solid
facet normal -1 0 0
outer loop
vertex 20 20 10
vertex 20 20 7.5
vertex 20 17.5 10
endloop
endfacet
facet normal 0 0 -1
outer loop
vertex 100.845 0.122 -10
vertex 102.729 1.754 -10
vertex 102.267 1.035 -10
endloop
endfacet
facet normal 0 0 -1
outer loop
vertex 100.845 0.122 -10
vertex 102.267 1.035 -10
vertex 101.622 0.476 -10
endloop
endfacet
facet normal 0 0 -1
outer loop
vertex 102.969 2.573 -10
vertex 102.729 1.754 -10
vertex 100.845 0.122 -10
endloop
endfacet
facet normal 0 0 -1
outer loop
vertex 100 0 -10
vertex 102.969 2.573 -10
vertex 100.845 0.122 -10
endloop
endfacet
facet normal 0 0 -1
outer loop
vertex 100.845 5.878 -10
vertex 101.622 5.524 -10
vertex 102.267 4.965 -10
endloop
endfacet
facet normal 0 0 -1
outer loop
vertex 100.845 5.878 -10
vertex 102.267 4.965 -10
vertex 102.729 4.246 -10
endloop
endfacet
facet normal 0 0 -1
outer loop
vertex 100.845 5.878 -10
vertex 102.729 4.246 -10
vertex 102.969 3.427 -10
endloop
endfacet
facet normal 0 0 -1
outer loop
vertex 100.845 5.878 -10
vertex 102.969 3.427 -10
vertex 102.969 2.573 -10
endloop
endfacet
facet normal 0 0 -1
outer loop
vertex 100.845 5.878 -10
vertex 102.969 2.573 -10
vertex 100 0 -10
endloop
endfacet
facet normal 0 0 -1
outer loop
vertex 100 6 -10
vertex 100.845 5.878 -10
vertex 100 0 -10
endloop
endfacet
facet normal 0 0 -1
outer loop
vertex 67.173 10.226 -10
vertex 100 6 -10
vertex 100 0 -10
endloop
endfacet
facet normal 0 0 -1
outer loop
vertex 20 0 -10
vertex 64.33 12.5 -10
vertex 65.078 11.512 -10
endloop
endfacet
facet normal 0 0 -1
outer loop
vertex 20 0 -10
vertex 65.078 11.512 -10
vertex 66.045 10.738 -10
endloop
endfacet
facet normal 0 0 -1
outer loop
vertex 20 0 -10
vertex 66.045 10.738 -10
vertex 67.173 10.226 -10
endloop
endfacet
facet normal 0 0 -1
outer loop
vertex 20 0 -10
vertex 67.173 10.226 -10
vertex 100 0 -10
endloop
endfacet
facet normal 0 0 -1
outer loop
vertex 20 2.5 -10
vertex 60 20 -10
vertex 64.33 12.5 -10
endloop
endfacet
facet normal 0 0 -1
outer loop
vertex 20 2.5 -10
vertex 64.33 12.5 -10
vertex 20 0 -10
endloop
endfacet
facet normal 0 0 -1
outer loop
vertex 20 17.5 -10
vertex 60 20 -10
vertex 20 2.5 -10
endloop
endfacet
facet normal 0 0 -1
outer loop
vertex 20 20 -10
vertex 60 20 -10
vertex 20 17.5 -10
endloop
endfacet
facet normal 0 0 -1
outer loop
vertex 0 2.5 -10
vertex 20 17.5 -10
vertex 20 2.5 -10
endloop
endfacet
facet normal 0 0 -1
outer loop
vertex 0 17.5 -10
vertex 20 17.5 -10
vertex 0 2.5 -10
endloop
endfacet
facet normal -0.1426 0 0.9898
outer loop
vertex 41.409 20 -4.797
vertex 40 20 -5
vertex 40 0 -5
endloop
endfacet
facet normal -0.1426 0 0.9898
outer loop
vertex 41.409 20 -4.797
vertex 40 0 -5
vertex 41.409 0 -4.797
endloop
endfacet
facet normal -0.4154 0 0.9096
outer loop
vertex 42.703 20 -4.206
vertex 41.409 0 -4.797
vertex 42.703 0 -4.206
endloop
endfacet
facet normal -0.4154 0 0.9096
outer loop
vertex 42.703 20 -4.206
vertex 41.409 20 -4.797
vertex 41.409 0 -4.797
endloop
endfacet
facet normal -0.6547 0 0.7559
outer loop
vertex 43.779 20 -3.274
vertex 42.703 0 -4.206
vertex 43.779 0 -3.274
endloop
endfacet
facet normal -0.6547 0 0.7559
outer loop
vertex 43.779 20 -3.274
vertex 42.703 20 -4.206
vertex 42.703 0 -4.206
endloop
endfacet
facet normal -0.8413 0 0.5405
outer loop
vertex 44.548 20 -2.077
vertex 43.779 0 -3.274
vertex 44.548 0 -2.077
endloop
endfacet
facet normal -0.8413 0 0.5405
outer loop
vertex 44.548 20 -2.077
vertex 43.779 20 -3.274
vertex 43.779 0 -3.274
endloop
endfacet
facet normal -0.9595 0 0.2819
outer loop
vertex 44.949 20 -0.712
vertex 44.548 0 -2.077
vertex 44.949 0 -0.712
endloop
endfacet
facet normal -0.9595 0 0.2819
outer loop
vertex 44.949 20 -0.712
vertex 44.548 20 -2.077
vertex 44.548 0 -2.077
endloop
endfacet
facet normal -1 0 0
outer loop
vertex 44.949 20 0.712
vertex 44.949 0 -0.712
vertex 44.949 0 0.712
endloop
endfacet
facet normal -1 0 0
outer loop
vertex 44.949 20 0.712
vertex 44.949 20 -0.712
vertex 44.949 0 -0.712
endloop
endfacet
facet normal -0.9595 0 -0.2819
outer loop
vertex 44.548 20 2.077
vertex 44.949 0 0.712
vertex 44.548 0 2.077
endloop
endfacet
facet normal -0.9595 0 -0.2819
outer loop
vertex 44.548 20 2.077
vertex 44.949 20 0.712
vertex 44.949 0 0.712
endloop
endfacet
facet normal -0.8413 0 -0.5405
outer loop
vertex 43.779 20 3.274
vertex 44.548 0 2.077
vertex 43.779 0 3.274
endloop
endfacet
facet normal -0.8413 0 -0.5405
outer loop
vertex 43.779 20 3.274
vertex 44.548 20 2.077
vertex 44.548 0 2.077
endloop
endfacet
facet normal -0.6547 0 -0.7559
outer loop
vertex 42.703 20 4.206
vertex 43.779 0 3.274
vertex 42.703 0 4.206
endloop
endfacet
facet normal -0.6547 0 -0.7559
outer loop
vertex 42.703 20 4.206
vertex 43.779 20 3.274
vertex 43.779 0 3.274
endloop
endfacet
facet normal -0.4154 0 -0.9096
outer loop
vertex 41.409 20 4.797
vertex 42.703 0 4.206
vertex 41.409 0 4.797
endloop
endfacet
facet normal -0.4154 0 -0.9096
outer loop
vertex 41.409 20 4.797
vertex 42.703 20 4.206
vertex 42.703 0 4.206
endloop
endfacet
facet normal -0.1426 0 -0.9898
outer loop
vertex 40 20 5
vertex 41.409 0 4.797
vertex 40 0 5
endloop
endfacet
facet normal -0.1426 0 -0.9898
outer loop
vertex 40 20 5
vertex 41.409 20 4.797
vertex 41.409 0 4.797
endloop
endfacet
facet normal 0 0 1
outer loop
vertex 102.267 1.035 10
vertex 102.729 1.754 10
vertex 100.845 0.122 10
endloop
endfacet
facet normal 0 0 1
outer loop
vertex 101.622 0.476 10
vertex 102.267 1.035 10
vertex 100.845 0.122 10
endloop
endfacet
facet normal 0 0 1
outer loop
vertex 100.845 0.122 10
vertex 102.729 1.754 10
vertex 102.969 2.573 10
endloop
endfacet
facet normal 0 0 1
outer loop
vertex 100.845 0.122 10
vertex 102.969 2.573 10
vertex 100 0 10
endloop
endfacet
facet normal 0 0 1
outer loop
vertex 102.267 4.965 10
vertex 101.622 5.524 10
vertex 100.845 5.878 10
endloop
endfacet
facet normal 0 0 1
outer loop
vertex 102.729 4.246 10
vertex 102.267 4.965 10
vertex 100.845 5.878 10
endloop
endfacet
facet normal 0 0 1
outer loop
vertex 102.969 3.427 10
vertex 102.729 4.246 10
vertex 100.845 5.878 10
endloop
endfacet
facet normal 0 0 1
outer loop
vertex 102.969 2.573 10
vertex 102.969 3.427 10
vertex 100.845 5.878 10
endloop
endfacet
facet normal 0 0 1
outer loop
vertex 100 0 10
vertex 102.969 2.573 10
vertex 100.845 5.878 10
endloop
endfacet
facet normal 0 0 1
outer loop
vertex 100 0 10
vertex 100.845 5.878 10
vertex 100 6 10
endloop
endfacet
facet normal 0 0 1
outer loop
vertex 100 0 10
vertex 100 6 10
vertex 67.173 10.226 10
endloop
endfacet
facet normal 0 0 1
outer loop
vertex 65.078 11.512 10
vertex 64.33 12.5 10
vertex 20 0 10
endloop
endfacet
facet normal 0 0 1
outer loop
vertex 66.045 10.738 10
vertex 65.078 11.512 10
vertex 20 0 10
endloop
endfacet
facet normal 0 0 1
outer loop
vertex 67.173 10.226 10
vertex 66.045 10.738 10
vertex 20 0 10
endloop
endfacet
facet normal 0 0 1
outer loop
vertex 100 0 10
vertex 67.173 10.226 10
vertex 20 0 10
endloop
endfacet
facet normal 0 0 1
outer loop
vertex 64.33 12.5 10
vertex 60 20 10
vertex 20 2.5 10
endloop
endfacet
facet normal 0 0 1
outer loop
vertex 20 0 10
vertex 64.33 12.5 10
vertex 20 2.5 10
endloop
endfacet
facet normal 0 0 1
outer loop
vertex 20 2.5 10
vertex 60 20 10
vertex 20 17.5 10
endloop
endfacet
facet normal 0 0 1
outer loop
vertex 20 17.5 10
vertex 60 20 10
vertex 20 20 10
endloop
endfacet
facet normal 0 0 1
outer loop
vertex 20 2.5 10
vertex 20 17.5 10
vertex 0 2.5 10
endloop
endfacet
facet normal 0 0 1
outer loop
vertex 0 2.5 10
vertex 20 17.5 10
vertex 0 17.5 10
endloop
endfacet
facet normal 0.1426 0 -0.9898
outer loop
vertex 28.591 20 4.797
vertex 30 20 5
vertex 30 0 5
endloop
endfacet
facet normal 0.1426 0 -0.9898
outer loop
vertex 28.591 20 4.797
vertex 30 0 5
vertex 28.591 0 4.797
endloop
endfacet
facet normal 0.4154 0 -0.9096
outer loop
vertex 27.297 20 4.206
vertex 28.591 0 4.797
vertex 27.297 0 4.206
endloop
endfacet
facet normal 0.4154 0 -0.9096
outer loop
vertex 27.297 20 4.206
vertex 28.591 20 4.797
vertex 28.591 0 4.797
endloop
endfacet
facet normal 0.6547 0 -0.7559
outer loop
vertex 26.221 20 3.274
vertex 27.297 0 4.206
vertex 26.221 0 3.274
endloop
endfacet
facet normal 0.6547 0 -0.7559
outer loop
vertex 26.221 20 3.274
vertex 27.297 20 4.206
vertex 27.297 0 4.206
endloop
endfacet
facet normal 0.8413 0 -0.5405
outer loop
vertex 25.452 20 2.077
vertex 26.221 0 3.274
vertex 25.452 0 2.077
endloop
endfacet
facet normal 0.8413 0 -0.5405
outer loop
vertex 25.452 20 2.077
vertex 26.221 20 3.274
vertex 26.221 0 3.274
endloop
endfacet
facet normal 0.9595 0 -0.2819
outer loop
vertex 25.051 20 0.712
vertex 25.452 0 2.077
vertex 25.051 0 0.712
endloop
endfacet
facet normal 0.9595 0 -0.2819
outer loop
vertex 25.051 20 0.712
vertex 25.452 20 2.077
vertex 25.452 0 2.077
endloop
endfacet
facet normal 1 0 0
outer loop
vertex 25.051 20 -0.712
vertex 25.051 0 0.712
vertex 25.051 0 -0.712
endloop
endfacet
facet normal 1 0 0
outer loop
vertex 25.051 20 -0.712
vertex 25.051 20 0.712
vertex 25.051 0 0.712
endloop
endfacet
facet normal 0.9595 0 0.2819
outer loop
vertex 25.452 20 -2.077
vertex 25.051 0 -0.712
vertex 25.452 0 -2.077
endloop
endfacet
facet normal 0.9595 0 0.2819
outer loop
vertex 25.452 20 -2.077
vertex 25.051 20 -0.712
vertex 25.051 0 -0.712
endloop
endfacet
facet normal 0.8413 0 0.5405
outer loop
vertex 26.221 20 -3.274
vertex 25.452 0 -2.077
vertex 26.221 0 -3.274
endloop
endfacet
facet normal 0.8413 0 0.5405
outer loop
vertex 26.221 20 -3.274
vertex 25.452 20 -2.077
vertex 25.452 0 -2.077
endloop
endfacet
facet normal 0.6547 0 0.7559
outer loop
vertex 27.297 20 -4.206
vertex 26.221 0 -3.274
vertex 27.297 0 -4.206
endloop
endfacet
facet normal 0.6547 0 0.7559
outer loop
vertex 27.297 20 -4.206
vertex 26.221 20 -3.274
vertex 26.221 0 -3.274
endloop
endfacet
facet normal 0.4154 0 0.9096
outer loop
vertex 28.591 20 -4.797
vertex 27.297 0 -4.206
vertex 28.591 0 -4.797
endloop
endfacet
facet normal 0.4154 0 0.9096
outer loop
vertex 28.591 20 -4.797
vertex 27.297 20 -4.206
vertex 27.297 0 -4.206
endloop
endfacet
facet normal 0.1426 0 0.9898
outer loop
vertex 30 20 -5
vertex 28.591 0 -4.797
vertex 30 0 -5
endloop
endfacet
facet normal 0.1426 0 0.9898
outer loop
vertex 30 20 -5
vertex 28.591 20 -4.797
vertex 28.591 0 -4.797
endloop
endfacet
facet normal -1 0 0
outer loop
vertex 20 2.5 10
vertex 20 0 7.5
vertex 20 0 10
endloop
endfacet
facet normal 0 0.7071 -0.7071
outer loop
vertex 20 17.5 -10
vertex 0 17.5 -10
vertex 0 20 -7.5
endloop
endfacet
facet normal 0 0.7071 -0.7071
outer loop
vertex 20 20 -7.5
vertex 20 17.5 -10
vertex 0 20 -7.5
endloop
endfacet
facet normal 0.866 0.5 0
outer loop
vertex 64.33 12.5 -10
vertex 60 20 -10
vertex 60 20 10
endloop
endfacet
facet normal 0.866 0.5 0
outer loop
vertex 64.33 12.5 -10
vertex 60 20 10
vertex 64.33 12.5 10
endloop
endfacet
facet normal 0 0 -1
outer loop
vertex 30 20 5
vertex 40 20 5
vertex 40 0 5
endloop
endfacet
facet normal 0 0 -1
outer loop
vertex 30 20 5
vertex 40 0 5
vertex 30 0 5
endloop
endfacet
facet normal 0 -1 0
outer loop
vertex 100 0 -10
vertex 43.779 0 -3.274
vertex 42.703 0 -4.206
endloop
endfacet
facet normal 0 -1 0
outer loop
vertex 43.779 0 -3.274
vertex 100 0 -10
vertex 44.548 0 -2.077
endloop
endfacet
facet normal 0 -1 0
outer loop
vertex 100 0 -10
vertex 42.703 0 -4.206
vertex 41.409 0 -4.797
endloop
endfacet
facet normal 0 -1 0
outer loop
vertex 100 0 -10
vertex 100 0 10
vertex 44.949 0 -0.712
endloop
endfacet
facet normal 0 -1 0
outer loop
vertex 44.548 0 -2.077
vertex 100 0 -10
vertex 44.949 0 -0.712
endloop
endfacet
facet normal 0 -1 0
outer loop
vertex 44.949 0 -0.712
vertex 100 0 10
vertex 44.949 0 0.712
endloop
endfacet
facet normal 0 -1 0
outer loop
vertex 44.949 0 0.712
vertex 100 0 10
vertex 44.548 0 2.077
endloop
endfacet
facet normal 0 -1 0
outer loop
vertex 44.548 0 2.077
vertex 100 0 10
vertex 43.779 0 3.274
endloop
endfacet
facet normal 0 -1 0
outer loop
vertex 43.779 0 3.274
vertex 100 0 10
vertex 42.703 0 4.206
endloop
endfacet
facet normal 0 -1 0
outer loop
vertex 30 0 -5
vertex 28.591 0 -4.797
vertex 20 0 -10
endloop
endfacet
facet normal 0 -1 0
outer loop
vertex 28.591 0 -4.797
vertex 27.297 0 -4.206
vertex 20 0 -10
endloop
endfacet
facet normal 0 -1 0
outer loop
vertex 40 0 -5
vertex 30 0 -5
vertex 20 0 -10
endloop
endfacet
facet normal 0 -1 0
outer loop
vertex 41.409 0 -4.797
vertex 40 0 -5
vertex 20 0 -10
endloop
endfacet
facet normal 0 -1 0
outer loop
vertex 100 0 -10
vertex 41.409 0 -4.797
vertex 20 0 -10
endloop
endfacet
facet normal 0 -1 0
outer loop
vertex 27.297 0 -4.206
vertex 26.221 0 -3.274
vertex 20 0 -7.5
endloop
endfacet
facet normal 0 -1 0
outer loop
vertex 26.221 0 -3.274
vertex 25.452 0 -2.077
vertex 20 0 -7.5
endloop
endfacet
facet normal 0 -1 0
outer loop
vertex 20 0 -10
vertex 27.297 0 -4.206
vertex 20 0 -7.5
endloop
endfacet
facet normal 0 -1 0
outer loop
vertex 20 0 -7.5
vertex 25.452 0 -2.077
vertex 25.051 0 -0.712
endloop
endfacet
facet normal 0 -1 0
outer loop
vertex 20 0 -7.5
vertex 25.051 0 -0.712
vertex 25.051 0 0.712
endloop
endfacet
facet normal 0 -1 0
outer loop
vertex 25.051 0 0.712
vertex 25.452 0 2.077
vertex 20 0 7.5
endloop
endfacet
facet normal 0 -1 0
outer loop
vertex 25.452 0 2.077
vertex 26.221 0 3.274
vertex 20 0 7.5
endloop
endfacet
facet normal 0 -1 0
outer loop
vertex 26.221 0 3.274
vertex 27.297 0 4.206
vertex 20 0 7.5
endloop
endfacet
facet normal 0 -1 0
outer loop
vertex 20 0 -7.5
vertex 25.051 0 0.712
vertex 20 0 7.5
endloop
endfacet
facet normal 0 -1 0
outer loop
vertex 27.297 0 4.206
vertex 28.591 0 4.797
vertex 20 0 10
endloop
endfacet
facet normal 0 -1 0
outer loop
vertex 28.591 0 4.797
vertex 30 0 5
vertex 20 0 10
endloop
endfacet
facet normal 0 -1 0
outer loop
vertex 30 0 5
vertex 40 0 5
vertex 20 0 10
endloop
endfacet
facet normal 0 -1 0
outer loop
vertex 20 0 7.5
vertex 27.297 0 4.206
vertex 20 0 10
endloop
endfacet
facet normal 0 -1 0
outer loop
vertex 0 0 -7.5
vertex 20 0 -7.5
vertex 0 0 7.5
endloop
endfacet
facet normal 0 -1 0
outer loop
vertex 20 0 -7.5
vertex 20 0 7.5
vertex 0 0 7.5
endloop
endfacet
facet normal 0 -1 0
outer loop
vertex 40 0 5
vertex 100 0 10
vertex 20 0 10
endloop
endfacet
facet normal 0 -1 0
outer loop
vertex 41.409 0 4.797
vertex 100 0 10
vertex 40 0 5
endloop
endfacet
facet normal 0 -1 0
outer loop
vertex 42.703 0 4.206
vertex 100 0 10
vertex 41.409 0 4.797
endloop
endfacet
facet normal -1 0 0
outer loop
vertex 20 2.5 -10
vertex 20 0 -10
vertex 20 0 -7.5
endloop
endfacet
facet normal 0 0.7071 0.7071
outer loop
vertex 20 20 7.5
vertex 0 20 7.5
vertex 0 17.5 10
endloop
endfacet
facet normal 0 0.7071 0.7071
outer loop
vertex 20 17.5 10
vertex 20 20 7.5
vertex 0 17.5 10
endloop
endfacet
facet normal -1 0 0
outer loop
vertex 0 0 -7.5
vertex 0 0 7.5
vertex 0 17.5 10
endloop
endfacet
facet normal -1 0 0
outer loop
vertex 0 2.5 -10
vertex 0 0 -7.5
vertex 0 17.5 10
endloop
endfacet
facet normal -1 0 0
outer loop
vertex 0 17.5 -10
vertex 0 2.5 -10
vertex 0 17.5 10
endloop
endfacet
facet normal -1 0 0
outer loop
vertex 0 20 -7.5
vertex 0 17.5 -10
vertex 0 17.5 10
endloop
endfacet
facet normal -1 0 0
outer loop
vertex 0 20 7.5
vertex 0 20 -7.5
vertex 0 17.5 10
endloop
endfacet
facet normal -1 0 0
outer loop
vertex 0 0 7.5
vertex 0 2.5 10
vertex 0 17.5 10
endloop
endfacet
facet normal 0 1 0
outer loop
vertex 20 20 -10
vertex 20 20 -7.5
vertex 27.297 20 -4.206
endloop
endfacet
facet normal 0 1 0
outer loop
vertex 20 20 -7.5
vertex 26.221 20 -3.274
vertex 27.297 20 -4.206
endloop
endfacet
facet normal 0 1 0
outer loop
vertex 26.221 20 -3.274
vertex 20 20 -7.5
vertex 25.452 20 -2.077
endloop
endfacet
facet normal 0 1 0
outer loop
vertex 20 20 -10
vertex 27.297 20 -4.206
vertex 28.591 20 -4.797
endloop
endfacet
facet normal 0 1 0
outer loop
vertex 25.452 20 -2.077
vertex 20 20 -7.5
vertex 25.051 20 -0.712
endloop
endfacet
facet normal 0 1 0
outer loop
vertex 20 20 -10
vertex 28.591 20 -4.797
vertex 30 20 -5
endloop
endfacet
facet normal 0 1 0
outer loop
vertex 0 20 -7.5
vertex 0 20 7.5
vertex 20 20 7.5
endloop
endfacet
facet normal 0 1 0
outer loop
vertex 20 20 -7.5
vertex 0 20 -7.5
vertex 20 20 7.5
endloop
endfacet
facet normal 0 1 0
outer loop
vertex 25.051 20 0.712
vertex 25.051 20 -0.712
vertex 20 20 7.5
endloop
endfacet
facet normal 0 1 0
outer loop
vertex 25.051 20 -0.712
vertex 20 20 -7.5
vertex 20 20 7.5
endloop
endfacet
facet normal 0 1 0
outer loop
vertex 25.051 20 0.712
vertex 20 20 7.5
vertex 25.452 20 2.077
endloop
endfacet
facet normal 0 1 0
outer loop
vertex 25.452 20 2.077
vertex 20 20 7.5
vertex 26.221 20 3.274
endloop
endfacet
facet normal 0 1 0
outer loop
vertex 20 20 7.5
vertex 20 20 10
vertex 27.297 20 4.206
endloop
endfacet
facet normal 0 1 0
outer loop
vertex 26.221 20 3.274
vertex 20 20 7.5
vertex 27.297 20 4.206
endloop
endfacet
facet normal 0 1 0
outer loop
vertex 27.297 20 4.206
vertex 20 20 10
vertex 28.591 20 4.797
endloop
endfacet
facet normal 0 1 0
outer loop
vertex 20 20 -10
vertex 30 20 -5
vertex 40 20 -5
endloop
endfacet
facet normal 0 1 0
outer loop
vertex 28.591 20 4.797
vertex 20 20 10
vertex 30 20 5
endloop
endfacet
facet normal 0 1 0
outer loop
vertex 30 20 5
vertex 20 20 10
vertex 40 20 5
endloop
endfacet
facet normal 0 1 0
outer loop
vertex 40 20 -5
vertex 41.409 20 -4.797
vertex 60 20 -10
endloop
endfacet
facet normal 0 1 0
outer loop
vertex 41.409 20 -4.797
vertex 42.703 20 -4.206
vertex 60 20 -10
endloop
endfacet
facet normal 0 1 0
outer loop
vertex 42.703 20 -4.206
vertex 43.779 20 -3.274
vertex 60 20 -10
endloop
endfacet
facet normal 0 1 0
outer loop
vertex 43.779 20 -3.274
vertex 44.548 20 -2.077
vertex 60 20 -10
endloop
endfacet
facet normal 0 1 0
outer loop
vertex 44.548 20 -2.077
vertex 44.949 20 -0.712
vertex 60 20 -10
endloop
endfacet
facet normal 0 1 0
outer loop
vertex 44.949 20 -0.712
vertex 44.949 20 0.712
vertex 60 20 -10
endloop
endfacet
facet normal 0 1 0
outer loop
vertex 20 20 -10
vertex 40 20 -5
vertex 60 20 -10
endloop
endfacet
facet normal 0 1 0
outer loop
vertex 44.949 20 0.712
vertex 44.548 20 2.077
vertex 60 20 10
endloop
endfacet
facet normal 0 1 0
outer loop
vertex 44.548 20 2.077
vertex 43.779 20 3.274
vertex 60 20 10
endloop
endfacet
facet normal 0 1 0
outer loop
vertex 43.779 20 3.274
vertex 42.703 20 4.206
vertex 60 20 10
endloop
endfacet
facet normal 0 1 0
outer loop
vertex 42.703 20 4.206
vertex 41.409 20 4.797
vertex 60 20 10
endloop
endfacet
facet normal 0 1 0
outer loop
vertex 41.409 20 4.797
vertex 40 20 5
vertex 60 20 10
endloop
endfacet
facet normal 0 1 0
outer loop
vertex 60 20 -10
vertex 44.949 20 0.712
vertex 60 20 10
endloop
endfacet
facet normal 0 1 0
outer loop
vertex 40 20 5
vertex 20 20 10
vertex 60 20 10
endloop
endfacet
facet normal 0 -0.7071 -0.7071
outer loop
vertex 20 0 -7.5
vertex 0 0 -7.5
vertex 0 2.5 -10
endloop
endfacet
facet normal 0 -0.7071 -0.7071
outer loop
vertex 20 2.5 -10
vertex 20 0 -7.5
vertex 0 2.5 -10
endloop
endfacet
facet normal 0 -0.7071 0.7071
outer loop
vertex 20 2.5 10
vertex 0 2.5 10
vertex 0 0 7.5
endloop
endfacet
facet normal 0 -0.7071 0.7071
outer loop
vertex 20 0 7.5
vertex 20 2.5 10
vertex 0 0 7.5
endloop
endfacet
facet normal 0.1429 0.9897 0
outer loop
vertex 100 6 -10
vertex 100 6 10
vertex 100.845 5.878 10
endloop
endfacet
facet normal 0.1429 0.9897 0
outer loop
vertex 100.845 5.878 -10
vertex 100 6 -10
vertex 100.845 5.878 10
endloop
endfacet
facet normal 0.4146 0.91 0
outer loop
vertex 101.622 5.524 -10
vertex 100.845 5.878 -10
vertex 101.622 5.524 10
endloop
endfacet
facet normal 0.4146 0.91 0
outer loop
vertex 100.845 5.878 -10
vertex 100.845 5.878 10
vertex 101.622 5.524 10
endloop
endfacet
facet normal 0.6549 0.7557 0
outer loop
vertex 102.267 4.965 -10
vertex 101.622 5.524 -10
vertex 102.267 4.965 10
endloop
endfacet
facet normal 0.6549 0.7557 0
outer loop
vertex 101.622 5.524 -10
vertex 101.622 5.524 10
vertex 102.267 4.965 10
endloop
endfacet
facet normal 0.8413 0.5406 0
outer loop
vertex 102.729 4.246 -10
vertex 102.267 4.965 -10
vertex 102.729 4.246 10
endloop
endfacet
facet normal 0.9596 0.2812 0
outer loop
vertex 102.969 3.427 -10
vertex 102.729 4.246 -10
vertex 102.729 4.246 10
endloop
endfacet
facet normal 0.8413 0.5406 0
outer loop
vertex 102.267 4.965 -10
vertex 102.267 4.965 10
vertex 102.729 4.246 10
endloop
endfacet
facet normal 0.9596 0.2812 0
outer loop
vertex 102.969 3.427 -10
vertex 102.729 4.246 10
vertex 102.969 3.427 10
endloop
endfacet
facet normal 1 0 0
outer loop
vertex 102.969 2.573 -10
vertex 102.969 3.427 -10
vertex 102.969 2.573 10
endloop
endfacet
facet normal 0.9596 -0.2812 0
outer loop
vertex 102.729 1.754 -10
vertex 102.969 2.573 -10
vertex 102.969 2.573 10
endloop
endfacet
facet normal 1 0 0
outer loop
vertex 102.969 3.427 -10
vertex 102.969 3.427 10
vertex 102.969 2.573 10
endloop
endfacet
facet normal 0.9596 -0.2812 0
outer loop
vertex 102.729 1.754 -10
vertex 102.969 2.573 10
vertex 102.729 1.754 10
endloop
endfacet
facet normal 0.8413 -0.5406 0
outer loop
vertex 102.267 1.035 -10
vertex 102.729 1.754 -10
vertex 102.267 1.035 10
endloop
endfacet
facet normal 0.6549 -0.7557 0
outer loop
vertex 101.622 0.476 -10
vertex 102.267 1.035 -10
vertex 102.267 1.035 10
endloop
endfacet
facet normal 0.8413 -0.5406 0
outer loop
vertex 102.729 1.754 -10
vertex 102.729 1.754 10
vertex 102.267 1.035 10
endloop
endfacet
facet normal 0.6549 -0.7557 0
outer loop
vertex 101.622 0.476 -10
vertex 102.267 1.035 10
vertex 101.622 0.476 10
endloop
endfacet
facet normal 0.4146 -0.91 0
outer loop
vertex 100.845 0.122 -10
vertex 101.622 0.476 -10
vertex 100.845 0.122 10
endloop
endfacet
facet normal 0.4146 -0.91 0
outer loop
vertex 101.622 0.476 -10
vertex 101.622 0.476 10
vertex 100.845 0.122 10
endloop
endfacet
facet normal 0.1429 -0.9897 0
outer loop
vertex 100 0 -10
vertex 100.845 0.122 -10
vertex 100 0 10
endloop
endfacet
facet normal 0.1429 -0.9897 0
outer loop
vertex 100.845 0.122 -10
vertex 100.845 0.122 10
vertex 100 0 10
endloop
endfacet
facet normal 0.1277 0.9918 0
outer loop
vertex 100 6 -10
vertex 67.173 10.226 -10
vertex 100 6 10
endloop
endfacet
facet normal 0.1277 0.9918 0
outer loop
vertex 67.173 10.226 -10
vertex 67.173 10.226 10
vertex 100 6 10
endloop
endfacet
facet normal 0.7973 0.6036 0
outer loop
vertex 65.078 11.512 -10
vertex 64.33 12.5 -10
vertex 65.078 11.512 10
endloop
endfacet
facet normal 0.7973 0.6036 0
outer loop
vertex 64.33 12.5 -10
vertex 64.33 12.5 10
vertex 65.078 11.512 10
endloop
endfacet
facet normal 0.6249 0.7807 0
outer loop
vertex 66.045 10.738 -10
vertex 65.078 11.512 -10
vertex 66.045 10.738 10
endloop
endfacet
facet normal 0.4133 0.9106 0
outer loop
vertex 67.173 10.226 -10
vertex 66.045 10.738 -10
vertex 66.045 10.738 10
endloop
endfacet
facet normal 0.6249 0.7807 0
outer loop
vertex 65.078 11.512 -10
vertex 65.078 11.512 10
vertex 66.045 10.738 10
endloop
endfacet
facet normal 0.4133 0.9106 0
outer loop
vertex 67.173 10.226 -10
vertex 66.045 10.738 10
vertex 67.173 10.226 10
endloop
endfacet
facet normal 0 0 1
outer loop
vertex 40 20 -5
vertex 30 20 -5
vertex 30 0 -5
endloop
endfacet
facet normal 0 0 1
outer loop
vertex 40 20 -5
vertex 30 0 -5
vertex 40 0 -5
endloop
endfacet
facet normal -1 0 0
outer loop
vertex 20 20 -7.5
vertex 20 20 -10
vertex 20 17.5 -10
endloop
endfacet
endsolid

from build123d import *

# Parameters (mm, degrees)
EXTRUDE_1_DEPTH     = 10
CUT_EXTRUDE_1_DEPTH = 106.399240984
CUT_EXTRUDE_2_DEPTH = 20


with BuildPart() as part:
    # 草图1 → 凸台-拉伸1 (new, symmetric)
    with BuildSketch(Plane.XY):
        with BuildLine():
            Line((0, 0), (0, 20))
            Line((0, 20), (60, 20))
            Line((60, 20), (64.330127019, 12.5))
            ThreePointArc((64.330127019, 12.5), (65.537347332, 11.095201195), (67.173135447, 10.226272076))
            Line((67.173135447, 10.226272076), (100, 6))
            ThreePointArc((100, 6), (103, 3), (100, 0))
            Line((100, 0), (0, 0))
        make_face()
    extrude(amount=EXTRUDE_1_DEPTH, both=True)

    # 草图2 → 切除-拉伸1 (cut, through all)
    with BuildSketch(Plane(origin=(0, 20, 0), x_dir=(1, 0, 0), z_dir=(0, 1, 0))):
        with BuildLine():
            Line((30, 5), (40, 5))
            ThreePointArc((40, 5), (45, 0), (40, -5))
            Line((40, -5), (30, -5))
            ThreePointArc((30, -5), (25, 0), (30, 5))
        make_face()
    extrude(amount=-CUT_EXTRUDE_1_DEPTH, mode=Mode.SUBTRACT)

    # 草图3 → 切除-拉伸2 (cut)
    with BuildSketch(Plane.ZY):
        Polygon((-10, 17.5), (-7.5, 20), (-10, 20), align=None)
        Polygon((10, 20), (7.5, 20), (10, 17.5), align=None)
        Polygon((10, 0), (10, 2.5), (7.5, 0), align=None)
        Polygon((-7.5, 0), (-10, 2.5), (-10, 0), align=None)
    extrude(amount=-CUT_EXTRUDE_2_DEPTH, mode=Mode.SUBTRACT)


solid = part.part
